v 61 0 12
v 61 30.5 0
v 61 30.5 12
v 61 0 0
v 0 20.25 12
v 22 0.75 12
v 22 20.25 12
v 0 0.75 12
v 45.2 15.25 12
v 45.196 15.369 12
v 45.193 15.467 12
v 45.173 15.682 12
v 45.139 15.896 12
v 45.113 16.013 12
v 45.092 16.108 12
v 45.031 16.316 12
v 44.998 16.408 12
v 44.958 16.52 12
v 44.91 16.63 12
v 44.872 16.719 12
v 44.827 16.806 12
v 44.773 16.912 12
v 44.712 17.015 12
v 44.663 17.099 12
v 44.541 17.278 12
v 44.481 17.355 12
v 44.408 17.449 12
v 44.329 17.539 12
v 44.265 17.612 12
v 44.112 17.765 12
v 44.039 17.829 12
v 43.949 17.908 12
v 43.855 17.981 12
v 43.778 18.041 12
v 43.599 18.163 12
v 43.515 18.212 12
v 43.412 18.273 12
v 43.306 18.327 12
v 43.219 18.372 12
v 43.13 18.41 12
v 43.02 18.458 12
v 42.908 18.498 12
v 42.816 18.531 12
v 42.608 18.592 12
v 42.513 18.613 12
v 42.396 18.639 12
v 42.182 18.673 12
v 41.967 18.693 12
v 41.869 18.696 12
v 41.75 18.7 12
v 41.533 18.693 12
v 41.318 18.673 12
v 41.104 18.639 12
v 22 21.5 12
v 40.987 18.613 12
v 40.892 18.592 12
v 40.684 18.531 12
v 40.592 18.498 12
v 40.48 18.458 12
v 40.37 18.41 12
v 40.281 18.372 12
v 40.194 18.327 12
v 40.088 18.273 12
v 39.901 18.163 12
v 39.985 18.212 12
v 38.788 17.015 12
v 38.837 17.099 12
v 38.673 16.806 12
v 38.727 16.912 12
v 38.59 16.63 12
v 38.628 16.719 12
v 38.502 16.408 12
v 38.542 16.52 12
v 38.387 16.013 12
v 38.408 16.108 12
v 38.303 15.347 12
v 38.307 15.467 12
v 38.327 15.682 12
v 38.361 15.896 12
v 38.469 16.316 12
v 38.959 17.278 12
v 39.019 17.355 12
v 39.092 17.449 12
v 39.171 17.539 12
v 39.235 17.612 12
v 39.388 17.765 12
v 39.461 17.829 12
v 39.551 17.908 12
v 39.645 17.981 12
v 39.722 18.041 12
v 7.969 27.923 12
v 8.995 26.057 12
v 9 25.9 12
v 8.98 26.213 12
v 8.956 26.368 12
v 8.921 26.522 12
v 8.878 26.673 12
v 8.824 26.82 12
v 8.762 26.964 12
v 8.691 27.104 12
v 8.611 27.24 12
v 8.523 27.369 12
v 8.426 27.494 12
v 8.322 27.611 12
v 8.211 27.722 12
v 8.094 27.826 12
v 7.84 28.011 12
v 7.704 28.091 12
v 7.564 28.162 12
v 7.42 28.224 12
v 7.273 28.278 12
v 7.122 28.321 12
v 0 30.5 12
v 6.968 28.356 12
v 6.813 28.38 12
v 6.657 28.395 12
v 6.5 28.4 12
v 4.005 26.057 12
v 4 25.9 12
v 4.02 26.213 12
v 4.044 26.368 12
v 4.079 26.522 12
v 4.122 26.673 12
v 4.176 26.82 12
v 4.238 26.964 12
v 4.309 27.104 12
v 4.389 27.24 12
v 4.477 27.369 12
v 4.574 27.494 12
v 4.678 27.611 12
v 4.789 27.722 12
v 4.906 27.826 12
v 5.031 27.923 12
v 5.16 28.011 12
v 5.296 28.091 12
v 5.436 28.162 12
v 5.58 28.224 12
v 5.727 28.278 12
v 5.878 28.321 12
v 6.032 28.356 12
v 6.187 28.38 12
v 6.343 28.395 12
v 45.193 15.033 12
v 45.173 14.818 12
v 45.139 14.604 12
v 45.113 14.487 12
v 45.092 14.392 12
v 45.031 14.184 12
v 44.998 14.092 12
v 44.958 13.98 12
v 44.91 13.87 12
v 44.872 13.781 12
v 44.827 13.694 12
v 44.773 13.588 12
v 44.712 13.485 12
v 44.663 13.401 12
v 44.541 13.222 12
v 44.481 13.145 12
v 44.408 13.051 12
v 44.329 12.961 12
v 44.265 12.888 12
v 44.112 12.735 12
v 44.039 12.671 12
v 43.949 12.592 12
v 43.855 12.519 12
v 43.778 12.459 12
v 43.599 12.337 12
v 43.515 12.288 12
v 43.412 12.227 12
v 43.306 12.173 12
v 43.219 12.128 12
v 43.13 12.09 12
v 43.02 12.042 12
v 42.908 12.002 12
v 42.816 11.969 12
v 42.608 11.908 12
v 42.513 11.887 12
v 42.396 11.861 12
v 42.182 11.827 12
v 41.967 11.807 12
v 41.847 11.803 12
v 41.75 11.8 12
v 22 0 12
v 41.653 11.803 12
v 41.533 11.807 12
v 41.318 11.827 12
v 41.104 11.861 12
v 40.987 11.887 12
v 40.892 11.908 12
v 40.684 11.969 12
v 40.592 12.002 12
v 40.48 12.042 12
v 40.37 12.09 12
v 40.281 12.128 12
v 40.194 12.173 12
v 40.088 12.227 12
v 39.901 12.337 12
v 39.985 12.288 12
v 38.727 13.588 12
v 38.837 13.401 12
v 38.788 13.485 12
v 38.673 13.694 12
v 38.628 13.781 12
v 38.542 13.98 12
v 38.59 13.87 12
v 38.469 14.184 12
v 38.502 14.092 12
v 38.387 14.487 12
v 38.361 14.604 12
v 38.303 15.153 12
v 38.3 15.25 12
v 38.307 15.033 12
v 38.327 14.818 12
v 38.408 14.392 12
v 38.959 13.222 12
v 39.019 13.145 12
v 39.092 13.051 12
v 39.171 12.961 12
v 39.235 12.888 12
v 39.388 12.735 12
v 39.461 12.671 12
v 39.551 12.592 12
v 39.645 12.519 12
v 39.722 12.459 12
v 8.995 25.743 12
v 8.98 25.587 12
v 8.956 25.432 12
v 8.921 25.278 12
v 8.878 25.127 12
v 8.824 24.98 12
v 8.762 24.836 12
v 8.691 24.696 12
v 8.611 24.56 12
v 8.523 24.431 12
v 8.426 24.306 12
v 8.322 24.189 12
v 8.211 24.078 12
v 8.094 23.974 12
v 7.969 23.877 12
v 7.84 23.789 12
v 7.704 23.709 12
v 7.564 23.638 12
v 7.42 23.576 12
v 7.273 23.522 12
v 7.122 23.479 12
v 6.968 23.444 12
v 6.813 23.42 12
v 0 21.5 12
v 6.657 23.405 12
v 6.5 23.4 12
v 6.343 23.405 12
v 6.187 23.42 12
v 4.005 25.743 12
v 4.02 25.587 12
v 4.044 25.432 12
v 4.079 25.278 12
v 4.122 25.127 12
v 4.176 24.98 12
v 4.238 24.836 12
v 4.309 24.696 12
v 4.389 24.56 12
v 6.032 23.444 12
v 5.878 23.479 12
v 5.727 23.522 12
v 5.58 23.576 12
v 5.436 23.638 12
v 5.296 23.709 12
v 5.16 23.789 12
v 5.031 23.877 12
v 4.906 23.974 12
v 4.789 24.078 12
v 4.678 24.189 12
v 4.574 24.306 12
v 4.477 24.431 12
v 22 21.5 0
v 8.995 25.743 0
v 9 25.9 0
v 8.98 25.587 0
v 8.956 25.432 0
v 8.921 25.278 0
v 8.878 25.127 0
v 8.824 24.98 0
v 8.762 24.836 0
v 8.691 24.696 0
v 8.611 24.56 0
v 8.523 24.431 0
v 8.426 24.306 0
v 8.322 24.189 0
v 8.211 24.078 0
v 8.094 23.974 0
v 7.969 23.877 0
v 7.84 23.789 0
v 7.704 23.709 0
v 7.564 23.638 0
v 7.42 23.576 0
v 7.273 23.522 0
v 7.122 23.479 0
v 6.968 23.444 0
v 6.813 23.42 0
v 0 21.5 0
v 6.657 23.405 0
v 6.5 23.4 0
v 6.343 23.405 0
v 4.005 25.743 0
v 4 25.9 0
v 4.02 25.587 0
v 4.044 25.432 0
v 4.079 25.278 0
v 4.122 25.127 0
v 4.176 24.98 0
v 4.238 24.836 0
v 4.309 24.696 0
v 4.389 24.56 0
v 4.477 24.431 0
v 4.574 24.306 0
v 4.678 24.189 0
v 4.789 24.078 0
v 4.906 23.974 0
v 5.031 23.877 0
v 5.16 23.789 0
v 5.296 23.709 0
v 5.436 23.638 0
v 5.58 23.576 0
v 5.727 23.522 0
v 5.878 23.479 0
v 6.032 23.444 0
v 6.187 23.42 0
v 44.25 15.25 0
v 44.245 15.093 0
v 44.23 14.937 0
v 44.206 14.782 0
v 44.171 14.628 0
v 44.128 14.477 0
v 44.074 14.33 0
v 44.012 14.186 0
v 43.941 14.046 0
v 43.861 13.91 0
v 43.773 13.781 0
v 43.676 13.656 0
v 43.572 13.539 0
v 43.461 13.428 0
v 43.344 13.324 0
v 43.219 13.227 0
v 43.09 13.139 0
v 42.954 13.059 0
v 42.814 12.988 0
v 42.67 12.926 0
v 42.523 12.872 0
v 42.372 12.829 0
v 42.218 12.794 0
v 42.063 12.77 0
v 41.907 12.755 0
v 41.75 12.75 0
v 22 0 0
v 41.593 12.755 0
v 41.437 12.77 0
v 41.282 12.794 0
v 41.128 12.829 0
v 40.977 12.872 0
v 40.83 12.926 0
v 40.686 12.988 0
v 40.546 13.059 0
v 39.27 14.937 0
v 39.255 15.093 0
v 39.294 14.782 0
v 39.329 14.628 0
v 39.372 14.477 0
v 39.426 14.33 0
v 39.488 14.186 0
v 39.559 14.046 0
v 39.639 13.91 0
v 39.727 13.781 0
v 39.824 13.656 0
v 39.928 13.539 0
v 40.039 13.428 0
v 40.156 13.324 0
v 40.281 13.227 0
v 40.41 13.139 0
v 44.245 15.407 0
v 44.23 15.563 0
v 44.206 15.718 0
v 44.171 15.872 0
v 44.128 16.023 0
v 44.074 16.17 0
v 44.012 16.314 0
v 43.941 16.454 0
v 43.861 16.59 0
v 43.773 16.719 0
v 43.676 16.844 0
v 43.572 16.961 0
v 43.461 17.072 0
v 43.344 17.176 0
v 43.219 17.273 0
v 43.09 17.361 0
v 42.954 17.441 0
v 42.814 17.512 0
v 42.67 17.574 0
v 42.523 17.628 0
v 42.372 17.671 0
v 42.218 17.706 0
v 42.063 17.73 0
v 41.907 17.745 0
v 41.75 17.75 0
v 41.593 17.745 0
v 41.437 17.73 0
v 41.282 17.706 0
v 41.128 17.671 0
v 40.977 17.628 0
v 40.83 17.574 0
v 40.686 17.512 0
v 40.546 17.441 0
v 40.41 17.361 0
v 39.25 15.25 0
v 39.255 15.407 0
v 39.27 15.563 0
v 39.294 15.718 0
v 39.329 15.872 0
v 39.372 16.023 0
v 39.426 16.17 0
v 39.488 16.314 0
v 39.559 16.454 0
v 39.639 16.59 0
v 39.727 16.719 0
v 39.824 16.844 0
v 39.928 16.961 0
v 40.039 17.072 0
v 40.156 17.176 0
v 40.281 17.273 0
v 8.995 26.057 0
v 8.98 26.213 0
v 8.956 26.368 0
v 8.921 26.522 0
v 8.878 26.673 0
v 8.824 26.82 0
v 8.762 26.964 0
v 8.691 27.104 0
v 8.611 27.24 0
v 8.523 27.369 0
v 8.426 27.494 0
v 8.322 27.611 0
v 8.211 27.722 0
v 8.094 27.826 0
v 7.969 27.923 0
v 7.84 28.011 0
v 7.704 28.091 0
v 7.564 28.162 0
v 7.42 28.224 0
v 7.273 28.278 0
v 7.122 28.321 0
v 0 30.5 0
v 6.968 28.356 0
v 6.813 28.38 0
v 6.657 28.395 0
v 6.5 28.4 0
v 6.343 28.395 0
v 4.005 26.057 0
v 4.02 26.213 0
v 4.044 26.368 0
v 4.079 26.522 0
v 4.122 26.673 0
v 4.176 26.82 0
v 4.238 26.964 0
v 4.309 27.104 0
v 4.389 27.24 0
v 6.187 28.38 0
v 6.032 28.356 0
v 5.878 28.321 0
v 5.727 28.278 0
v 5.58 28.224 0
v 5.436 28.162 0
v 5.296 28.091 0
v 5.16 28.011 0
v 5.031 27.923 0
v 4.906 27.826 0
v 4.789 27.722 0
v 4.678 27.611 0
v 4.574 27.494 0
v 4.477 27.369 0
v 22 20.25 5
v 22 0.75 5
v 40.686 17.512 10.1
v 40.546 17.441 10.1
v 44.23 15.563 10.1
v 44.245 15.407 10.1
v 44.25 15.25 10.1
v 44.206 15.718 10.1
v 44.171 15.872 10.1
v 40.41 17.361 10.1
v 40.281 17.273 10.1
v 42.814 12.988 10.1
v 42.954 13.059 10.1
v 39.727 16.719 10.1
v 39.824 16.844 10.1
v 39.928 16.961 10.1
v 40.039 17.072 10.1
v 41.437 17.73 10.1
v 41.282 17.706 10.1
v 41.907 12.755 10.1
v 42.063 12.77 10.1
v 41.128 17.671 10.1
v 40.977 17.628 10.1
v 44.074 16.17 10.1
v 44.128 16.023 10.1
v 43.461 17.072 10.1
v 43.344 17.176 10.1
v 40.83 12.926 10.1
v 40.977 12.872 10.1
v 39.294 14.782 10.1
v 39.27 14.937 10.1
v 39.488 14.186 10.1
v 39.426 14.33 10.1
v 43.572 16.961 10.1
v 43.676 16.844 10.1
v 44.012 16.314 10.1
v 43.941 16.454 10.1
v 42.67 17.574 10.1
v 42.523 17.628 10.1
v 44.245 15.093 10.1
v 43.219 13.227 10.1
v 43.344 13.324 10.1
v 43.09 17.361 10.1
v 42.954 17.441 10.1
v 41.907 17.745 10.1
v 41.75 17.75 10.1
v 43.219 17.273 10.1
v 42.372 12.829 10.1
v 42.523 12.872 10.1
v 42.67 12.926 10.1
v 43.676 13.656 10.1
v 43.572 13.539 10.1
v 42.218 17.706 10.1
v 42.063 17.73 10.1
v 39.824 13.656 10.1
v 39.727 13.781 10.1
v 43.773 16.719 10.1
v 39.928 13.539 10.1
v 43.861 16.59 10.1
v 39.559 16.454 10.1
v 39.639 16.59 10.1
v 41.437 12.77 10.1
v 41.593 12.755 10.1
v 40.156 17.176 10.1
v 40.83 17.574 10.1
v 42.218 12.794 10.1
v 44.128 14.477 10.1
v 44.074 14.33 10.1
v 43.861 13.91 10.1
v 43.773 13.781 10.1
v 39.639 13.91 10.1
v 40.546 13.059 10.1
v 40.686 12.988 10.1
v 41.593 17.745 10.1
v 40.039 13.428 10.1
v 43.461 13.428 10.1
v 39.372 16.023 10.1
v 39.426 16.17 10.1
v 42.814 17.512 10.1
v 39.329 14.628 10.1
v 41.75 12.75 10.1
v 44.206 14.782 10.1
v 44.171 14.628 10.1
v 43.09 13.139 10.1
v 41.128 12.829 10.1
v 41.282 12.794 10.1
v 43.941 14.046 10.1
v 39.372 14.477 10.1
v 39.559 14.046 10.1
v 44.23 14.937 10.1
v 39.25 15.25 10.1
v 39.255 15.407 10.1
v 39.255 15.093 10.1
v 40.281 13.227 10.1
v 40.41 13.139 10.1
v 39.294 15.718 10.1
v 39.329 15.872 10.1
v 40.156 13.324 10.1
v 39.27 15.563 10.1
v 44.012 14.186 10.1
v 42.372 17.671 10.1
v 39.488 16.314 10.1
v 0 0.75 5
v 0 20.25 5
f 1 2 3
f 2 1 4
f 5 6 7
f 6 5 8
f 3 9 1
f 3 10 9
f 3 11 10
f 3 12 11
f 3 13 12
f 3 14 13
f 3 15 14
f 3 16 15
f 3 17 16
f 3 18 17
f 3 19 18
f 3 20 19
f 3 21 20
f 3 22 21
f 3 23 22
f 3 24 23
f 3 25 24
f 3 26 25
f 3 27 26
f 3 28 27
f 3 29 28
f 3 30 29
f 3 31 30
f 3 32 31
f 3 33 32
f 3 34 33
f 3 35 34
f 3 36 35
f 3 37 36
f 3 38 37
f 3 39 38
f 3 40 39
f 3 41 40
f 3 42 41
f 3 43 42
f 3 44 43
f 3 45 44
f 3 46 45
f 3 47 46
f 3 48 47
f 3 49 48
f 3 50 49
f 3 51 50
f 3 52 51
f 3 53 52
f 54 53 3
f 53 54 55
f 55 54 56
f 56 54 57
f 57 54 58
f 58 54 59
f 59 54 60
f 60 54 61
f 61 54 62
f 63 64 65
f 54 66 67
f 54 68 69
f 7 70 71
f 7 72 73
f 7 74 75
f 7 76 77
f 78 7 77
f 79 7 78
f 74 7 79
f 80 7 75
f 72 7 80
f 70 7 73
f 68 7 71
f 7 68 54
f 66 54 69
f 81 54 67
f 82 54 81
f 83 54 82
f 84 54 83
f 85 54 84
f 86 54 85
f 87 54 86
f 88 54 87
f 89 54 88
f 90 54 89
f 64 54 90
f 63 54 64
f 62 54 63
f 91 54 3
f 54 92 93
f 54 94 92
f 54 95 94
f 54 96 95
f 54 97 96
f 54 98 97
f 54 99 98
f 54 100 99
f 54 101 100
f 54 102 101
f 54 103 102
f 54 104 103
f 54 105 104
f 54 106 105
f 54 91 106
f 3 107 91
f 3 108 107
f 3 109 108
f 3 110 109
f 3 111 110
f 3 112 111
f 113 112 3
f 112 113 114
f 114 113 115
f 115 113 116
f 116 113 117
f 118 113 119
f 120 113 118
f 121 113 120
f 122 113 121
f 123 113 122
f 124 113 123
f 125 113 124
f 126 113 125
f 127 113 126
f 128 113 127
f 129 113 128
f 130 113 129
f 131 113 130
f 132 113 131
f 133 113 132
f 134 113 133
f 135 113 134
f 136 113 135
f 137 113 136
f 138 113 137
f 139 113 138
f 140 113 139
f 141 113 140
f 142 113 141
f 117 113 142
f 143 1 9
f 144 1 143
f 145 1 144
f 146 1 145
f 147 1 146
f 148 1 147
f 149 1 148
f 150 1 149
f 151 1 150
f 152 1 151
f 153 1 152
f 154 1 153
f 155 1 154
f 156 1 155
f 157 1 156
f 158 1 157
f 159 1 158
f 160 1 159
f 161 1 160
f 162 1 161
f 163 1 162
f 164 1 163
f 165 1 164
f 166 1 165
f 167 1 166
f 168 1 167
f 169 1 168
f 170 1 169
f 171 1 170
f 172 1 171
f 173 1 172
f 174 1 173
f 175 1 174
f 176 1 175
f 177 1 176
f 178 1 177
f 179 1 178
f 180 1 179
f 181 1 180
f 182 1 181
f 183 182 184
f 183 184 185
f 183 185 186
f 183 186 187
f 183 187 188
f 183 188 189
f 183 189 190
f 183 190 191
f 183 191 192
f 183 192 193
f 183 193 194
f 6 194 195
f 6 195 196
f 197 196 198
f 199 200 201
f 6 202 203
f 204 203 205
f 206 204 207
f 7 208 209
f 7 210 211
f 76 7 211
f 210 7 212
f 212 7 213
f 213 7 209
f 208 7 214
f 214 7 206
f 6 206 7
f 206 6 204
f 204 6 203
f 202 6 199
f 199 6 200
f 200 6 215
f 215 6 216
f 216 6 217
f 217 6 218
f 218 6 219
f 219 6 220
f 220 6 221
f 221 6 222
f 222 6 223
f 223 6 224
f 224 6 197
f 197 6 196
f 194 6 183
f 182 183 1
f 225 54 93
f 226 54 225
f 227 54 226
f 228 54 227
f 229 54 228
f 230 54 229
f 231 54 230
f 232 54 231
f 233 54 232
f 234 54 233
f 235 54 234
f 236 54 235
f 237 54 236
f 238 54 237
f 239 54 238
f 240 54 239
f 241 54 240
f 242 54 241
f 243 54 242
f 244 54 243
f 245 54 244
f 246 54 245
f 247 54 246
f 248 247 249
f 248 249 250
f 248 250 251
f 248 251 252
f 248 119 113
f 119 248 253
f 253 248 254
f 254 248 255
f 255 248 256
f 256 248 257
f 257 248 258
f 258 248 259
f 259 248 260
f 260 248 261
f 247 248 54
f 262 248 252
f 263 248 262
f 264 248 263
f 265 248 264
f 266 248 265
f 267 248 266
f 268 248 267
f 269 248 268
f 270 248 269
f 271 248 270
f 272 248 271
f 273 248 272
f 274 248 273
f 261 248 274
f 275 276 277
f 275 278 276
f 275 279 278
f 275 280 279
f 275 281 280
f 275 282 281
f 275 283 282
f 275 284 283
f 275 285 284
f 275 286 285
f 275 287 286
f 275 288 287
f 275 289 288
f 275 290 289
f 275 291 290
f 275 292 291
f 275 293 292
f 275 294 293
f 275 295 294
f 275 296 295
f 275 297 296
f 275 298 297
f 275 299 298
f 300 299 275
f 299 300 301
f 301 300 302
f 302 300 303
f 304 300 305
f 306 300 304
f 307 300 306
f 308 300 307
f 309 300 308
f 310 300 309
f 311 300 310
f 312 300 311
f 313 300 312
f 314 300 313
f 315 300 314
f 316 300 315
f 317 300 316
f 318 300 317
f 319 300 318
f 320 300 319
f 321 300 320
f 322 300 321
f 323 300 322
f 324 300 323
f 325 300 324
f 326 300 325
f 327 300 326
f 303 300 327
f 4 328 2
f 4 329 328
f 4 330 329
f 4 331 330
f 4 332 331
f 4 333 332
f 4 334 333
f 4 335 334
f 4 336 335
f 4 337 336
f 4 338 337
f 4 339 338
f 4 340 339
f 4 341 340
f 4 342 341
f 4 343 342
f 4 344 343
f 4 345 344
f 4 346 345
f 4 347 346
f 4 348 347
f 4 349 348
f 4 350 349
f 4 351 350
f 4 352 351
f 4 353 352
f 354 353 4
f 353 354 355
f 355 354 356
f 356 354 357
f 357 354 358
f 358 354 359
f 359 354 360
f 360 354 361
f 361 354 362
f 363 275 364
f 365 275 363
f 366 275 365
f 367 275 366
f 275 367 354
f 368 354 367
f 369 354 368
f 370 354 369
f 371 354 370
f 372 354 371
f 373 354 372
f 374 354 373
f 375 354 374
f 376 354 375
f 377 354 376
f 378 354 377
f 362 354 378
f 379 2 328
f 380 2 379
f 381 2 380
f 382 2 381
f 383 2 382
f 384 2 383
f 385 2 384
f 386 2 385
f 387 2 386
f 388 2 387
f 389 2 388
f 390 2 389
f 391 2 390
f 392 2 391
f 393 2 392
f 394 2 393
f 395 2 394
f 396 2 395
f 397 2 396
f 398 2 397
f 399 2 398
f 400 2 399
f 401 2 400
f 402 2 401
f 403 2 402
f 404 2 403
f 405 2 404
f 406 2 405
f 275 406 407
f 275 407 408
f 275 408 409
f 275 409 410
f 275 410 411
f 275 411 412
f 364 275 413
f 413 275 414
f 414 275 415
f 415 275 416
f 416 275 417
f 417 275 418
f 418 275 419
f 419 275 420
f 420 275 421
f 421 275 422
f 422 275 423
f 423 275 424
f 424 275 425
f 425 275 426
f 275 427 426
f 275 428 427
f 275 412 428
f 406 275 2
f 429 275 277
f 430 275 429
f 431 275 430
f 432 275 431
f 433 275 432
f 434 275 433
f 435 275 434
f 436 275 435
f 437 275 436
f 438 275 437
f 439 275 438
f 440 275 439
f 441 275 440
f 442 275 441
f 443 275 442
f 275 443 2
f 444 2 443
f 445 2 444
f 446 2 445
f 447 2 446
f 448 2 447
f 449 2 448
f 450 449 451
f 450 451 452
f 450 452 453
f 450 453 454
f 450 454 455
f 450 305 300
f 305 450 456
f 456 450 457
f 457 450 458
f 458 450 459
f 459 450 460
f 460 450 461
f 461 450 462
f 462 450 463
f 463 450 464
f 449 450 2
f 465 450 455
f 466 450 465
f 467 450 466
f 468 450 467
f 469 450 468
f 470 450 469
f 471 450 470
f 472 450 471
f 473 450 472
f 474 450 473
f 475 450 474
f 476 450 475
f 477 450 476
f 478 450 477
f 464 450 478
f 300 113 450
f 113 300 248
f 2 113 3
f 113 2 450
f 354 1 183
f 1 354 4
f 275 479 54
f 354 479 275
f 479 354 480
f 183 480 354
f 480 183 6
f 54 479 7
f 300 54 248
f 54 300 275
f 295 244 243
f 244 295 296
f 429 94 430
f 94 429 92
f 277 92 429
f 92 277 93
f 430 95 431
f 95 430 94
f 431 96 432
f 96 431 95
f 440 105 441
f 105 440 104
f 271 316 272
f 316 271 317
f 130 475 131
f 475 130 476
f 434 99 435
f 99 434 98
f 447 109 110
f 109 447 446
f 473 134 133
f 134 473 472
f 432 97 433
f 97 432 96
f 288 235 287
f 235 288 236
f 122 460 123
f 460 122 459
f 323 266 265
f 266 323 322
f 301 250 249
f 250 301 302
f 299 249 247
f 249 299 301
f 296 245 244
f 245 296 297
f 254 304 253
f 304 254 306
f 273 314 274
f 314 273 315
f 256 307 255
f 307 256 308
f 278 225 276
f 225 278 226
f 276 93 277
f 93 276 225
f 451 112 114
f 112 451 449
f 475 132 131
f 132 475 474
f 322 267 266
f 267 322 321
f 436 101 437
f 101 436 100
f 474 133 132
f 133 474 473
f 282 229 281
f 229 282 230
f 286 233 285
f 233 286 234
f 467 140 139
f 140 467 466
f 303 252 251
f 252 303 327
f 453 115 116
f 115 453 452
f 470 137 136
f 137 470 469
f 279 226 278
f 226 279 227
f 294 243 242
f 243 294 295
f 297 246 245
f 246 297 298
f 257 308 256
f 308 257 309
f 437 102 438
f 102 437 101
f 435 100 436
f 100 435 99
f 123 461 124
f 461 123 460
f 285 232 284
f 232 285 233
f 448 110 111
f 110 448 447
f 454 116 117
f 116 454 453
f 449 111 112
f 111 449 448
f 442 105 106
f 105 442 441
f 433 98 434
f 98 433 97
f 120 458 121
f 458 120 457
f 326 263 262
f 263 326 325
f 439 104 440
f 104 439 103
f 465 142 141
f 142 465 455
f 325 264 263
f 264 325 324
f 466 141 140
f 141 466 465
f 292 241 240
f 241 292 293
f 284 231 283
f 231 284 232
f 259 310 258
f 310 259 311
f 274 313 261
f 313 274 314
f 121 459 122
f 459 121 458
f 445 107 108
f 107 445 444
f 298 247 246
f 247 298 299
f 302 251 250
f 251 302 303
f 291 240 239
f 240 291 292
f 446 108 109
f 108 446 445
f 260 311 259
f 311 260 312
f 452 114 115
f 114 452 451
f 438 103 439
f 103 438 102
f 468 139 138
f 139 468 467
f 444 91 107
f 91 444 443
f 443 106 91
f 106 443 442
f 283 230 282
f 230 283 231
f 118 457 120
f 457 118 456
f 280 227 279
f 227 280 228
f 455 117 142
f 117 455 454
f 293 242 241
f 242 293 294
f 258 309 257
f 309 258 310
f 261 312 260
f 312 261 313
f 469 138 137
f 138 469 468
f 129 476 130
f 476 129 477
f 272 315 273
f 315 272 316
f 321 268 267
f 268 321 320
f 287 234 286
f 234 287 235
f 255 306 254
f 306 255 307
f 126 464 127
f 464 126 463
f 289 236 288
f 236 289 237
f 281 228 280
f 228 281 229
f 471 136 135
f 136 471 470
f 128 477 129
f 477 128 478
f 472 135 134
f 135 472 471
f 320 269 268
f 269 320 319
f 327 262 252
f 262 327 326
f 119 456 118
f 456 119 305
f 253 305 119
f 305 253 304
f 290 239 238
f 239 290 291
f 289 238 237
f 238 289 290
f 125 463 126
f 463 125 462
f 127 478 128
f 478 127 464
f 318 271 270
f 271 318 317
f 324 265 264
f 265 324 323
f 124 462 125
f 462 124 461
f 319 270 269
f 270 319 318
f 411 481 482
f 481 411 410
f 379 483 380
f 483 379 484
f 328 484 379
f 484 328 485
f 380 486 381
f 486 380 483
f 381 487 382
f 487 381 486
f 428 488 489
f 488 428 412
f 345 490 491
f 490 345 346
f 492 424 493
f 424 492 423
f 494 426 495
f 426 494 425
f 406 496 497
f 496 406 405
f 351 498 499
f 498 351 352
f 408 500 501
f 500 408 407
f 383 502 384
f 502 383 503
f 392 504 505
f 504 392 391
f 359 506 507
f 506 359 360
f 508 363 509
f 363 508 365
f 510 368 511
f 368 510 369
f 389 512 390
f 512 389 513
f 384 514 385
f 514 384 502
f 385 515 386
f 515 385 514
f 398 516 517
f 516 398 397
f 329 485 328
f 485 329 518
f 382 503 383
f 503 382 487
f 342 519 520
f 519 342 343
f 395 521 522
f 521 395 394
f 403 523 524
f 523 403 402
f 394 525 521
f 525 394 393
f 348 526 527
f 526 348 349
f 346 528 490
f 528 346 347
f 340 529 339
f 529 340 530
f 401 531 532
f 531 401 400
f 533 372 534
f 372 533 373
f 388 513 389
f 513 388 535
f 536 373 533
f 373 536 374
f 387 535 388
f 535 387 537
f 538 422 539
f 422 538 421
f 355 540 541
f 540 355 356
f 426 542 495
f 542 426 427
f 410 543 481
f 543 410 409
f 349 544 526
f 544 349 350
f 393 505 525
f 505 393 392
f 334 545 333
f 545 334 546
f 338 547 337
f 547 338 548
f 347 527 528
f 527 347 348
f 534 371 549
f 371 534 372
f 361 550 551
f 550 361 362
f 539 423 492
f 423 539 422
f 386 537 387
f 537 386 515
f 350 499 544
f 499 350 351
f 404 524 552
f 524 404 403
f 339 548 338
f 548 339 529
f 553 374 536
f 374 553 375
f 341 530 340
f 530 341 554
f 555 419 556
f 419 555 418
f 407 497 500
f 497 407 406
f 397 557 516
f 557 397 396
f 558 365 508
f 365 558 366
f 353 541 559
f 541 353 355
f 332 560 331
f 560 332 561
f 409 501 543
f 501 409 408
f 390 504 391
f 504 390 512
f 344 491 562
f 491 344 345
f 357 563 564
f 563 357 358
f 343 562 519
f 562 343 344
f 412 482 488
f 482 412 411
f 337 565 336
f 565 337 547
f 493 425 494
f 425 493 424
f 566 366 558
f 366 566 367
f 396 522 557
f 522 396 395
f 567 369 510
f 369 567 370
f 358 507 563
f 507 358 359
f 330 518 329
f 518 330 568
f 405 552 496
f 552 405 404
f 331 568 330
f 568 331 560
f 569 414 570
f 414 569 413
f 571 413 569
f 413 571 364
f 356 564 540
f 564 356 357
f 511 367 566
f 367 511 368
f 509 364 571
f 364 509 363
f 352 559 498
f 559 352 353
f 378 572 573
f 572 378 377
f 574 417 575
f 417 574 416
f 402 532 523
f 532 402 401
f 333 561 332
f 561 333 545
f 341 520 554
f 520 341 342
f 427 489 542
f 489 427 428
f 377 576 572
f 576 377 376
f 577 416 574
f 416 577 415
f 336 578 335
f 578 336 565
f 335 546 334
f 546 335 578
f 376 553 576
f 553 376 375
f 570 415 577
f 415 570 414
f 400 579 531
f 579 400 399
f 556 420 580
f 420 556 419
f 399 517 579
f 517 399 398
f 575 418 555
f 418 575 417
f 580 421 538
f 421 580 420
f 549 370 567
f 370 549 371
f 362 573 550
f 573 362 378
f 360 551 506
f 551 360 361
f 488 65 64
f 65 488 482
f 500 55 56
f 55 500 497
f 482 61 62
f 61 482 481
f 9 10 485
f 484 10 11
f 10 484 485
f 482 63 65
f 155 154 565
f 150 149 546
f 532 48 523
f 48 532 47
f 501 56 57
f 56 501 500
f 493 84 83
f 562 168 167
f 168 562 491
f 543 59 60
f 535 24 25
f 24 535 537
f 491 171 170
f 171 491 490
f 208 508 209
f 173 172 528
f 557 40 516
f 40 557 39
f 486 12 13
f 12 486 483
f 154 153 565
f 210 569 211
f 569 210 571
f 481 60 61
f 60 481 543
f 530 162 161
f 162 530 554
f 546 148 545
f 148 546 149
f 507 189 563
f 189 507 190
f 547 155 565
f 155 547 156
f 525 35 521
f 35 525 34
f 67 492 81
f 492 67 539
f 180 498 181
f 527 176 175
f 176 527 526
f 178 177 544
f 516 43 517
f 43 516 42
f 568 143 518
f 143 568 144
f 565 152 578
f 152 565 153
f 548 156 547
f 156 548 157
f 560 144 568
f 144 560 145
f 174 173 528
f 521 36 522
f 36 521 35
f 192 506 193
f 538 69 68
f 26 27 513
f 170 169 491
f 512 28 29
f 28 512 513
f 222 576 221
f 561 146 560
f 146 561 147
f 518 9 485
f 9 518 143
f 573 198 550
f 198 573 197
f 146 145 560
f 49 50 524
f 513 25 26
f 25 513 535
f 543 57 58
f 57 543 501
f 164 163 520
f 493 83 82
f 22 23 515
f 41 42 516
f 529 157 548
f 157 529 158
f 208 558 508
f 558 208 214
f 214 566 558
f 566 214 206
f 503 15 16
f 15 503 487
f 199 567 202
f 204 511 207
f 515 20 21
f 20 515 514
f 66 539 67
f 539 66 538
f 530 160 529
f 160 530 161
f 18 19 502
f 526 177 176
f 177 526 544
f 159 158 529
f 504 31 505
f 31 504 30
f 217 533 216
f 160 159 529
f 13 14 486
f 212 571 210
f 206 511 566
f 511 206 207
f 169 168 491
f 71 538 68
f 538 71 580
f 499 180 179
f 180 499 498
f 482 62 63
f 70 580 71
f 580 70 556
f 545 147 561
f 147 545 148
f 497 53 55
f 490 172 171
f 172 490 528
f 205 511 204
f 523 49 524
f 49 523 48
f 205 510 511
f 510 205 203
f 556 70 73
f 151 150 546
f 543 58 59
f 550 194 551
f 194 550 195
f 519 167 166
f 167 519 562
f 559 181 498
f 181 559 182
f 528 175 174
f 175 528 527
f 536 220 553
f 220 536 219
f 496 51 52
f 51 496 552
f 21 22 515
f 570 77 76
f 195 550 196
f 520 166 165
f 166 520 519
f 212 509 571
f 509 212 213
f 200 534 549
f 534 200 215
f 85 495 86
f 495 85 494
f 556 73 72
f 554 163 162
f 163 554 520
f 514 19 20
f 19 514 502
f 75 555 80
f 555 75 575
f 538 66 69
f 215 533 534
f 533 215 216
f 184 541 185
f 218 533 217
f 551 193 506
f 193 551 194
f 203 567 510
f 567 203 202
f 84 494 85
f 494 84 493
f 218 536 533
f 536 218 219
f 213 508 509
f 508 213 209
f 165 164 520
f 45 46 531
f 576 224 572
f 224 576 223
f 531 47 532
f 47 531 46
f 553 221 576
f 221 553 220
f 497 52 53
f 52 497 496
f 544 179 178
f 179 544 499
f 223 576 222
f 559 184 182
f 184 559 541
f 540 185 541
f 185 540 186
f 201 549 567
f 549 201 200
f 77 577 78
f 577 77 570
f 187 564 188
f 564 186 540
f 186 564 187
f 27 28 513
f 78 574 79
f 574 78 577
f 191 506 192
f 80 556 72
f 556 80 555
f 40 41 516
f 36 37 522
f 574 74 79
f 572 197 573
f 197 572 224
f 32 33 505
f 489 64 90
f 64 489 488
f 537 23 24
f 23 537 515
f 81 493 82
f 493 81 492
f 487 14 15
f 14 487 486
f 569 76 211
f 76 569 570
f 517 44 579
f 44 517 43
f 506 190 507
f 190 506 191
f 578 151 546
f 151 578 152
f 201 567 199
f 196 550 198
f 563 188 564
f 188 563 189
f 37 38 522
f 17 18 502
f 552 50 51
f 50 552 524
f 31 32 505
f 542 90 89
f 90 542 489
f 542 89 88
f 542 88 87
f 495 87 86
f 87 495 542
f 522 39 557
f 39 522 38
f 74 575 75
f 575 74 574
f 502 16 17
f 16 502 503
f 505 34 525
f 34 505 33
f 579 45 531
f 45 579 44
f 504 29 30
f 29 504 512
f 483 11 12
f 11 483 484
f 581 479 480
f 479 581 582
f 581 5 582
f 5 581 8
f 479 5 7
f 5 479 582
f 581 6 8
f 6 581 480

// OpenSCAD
side = "a"; // a or b
width = 12;

if (side == "a") {
    union() {
        difference() {
            // base
            cube(size = [61,30.5,width], center = false);
            
            // hueco rail
            translate([-0.5,-0.5,-0.5]) cube(size = [22.5,22,width+1], center = false);

            // tornillo mosquitera
            translate([6.5,25.9,-0.5]) cylinder(h=width+1, d=5, $fn=100);

            // tornillo soporte
            translate([41.75,15.25,-0.5]) cylinder(h=width+1, d=5, $fn=100);
            translate([41.75,15.25,10.1]) cylinder(h=5, d1=5, d2=10, $fn=100);
        }
        
        // engache rail
        translate([0,0.75,5]) cube(size = [22,19.5,width-5], center = false);
    }
} else {
        union() {
        difference() {
            // base
            cube(size = [61,30.5,width], center = false);
            
            // hueco rail
            translate([-0.5,-0.5,-0.5]) cube(size = [22.5,22,width+1], center = false);

            // tornillo mosquitera
            translate([6.5,25.9,-0.5]) cylinder(h=width+1, d=5, $fn=100);

            // tornillo soporte
            translate([41.75,15.25,-0.5]) cylinder(h=width+1, d=5, $fn=100);
            translate([41.75,15.25,-0.1]) cylinder(h=5, d1=10, d2=5, $fn=100);
        }
        
        // engache rail
        translate([0,0.75,0]) cube(size = [22,19.5,width-5], center = false);
    }
}
